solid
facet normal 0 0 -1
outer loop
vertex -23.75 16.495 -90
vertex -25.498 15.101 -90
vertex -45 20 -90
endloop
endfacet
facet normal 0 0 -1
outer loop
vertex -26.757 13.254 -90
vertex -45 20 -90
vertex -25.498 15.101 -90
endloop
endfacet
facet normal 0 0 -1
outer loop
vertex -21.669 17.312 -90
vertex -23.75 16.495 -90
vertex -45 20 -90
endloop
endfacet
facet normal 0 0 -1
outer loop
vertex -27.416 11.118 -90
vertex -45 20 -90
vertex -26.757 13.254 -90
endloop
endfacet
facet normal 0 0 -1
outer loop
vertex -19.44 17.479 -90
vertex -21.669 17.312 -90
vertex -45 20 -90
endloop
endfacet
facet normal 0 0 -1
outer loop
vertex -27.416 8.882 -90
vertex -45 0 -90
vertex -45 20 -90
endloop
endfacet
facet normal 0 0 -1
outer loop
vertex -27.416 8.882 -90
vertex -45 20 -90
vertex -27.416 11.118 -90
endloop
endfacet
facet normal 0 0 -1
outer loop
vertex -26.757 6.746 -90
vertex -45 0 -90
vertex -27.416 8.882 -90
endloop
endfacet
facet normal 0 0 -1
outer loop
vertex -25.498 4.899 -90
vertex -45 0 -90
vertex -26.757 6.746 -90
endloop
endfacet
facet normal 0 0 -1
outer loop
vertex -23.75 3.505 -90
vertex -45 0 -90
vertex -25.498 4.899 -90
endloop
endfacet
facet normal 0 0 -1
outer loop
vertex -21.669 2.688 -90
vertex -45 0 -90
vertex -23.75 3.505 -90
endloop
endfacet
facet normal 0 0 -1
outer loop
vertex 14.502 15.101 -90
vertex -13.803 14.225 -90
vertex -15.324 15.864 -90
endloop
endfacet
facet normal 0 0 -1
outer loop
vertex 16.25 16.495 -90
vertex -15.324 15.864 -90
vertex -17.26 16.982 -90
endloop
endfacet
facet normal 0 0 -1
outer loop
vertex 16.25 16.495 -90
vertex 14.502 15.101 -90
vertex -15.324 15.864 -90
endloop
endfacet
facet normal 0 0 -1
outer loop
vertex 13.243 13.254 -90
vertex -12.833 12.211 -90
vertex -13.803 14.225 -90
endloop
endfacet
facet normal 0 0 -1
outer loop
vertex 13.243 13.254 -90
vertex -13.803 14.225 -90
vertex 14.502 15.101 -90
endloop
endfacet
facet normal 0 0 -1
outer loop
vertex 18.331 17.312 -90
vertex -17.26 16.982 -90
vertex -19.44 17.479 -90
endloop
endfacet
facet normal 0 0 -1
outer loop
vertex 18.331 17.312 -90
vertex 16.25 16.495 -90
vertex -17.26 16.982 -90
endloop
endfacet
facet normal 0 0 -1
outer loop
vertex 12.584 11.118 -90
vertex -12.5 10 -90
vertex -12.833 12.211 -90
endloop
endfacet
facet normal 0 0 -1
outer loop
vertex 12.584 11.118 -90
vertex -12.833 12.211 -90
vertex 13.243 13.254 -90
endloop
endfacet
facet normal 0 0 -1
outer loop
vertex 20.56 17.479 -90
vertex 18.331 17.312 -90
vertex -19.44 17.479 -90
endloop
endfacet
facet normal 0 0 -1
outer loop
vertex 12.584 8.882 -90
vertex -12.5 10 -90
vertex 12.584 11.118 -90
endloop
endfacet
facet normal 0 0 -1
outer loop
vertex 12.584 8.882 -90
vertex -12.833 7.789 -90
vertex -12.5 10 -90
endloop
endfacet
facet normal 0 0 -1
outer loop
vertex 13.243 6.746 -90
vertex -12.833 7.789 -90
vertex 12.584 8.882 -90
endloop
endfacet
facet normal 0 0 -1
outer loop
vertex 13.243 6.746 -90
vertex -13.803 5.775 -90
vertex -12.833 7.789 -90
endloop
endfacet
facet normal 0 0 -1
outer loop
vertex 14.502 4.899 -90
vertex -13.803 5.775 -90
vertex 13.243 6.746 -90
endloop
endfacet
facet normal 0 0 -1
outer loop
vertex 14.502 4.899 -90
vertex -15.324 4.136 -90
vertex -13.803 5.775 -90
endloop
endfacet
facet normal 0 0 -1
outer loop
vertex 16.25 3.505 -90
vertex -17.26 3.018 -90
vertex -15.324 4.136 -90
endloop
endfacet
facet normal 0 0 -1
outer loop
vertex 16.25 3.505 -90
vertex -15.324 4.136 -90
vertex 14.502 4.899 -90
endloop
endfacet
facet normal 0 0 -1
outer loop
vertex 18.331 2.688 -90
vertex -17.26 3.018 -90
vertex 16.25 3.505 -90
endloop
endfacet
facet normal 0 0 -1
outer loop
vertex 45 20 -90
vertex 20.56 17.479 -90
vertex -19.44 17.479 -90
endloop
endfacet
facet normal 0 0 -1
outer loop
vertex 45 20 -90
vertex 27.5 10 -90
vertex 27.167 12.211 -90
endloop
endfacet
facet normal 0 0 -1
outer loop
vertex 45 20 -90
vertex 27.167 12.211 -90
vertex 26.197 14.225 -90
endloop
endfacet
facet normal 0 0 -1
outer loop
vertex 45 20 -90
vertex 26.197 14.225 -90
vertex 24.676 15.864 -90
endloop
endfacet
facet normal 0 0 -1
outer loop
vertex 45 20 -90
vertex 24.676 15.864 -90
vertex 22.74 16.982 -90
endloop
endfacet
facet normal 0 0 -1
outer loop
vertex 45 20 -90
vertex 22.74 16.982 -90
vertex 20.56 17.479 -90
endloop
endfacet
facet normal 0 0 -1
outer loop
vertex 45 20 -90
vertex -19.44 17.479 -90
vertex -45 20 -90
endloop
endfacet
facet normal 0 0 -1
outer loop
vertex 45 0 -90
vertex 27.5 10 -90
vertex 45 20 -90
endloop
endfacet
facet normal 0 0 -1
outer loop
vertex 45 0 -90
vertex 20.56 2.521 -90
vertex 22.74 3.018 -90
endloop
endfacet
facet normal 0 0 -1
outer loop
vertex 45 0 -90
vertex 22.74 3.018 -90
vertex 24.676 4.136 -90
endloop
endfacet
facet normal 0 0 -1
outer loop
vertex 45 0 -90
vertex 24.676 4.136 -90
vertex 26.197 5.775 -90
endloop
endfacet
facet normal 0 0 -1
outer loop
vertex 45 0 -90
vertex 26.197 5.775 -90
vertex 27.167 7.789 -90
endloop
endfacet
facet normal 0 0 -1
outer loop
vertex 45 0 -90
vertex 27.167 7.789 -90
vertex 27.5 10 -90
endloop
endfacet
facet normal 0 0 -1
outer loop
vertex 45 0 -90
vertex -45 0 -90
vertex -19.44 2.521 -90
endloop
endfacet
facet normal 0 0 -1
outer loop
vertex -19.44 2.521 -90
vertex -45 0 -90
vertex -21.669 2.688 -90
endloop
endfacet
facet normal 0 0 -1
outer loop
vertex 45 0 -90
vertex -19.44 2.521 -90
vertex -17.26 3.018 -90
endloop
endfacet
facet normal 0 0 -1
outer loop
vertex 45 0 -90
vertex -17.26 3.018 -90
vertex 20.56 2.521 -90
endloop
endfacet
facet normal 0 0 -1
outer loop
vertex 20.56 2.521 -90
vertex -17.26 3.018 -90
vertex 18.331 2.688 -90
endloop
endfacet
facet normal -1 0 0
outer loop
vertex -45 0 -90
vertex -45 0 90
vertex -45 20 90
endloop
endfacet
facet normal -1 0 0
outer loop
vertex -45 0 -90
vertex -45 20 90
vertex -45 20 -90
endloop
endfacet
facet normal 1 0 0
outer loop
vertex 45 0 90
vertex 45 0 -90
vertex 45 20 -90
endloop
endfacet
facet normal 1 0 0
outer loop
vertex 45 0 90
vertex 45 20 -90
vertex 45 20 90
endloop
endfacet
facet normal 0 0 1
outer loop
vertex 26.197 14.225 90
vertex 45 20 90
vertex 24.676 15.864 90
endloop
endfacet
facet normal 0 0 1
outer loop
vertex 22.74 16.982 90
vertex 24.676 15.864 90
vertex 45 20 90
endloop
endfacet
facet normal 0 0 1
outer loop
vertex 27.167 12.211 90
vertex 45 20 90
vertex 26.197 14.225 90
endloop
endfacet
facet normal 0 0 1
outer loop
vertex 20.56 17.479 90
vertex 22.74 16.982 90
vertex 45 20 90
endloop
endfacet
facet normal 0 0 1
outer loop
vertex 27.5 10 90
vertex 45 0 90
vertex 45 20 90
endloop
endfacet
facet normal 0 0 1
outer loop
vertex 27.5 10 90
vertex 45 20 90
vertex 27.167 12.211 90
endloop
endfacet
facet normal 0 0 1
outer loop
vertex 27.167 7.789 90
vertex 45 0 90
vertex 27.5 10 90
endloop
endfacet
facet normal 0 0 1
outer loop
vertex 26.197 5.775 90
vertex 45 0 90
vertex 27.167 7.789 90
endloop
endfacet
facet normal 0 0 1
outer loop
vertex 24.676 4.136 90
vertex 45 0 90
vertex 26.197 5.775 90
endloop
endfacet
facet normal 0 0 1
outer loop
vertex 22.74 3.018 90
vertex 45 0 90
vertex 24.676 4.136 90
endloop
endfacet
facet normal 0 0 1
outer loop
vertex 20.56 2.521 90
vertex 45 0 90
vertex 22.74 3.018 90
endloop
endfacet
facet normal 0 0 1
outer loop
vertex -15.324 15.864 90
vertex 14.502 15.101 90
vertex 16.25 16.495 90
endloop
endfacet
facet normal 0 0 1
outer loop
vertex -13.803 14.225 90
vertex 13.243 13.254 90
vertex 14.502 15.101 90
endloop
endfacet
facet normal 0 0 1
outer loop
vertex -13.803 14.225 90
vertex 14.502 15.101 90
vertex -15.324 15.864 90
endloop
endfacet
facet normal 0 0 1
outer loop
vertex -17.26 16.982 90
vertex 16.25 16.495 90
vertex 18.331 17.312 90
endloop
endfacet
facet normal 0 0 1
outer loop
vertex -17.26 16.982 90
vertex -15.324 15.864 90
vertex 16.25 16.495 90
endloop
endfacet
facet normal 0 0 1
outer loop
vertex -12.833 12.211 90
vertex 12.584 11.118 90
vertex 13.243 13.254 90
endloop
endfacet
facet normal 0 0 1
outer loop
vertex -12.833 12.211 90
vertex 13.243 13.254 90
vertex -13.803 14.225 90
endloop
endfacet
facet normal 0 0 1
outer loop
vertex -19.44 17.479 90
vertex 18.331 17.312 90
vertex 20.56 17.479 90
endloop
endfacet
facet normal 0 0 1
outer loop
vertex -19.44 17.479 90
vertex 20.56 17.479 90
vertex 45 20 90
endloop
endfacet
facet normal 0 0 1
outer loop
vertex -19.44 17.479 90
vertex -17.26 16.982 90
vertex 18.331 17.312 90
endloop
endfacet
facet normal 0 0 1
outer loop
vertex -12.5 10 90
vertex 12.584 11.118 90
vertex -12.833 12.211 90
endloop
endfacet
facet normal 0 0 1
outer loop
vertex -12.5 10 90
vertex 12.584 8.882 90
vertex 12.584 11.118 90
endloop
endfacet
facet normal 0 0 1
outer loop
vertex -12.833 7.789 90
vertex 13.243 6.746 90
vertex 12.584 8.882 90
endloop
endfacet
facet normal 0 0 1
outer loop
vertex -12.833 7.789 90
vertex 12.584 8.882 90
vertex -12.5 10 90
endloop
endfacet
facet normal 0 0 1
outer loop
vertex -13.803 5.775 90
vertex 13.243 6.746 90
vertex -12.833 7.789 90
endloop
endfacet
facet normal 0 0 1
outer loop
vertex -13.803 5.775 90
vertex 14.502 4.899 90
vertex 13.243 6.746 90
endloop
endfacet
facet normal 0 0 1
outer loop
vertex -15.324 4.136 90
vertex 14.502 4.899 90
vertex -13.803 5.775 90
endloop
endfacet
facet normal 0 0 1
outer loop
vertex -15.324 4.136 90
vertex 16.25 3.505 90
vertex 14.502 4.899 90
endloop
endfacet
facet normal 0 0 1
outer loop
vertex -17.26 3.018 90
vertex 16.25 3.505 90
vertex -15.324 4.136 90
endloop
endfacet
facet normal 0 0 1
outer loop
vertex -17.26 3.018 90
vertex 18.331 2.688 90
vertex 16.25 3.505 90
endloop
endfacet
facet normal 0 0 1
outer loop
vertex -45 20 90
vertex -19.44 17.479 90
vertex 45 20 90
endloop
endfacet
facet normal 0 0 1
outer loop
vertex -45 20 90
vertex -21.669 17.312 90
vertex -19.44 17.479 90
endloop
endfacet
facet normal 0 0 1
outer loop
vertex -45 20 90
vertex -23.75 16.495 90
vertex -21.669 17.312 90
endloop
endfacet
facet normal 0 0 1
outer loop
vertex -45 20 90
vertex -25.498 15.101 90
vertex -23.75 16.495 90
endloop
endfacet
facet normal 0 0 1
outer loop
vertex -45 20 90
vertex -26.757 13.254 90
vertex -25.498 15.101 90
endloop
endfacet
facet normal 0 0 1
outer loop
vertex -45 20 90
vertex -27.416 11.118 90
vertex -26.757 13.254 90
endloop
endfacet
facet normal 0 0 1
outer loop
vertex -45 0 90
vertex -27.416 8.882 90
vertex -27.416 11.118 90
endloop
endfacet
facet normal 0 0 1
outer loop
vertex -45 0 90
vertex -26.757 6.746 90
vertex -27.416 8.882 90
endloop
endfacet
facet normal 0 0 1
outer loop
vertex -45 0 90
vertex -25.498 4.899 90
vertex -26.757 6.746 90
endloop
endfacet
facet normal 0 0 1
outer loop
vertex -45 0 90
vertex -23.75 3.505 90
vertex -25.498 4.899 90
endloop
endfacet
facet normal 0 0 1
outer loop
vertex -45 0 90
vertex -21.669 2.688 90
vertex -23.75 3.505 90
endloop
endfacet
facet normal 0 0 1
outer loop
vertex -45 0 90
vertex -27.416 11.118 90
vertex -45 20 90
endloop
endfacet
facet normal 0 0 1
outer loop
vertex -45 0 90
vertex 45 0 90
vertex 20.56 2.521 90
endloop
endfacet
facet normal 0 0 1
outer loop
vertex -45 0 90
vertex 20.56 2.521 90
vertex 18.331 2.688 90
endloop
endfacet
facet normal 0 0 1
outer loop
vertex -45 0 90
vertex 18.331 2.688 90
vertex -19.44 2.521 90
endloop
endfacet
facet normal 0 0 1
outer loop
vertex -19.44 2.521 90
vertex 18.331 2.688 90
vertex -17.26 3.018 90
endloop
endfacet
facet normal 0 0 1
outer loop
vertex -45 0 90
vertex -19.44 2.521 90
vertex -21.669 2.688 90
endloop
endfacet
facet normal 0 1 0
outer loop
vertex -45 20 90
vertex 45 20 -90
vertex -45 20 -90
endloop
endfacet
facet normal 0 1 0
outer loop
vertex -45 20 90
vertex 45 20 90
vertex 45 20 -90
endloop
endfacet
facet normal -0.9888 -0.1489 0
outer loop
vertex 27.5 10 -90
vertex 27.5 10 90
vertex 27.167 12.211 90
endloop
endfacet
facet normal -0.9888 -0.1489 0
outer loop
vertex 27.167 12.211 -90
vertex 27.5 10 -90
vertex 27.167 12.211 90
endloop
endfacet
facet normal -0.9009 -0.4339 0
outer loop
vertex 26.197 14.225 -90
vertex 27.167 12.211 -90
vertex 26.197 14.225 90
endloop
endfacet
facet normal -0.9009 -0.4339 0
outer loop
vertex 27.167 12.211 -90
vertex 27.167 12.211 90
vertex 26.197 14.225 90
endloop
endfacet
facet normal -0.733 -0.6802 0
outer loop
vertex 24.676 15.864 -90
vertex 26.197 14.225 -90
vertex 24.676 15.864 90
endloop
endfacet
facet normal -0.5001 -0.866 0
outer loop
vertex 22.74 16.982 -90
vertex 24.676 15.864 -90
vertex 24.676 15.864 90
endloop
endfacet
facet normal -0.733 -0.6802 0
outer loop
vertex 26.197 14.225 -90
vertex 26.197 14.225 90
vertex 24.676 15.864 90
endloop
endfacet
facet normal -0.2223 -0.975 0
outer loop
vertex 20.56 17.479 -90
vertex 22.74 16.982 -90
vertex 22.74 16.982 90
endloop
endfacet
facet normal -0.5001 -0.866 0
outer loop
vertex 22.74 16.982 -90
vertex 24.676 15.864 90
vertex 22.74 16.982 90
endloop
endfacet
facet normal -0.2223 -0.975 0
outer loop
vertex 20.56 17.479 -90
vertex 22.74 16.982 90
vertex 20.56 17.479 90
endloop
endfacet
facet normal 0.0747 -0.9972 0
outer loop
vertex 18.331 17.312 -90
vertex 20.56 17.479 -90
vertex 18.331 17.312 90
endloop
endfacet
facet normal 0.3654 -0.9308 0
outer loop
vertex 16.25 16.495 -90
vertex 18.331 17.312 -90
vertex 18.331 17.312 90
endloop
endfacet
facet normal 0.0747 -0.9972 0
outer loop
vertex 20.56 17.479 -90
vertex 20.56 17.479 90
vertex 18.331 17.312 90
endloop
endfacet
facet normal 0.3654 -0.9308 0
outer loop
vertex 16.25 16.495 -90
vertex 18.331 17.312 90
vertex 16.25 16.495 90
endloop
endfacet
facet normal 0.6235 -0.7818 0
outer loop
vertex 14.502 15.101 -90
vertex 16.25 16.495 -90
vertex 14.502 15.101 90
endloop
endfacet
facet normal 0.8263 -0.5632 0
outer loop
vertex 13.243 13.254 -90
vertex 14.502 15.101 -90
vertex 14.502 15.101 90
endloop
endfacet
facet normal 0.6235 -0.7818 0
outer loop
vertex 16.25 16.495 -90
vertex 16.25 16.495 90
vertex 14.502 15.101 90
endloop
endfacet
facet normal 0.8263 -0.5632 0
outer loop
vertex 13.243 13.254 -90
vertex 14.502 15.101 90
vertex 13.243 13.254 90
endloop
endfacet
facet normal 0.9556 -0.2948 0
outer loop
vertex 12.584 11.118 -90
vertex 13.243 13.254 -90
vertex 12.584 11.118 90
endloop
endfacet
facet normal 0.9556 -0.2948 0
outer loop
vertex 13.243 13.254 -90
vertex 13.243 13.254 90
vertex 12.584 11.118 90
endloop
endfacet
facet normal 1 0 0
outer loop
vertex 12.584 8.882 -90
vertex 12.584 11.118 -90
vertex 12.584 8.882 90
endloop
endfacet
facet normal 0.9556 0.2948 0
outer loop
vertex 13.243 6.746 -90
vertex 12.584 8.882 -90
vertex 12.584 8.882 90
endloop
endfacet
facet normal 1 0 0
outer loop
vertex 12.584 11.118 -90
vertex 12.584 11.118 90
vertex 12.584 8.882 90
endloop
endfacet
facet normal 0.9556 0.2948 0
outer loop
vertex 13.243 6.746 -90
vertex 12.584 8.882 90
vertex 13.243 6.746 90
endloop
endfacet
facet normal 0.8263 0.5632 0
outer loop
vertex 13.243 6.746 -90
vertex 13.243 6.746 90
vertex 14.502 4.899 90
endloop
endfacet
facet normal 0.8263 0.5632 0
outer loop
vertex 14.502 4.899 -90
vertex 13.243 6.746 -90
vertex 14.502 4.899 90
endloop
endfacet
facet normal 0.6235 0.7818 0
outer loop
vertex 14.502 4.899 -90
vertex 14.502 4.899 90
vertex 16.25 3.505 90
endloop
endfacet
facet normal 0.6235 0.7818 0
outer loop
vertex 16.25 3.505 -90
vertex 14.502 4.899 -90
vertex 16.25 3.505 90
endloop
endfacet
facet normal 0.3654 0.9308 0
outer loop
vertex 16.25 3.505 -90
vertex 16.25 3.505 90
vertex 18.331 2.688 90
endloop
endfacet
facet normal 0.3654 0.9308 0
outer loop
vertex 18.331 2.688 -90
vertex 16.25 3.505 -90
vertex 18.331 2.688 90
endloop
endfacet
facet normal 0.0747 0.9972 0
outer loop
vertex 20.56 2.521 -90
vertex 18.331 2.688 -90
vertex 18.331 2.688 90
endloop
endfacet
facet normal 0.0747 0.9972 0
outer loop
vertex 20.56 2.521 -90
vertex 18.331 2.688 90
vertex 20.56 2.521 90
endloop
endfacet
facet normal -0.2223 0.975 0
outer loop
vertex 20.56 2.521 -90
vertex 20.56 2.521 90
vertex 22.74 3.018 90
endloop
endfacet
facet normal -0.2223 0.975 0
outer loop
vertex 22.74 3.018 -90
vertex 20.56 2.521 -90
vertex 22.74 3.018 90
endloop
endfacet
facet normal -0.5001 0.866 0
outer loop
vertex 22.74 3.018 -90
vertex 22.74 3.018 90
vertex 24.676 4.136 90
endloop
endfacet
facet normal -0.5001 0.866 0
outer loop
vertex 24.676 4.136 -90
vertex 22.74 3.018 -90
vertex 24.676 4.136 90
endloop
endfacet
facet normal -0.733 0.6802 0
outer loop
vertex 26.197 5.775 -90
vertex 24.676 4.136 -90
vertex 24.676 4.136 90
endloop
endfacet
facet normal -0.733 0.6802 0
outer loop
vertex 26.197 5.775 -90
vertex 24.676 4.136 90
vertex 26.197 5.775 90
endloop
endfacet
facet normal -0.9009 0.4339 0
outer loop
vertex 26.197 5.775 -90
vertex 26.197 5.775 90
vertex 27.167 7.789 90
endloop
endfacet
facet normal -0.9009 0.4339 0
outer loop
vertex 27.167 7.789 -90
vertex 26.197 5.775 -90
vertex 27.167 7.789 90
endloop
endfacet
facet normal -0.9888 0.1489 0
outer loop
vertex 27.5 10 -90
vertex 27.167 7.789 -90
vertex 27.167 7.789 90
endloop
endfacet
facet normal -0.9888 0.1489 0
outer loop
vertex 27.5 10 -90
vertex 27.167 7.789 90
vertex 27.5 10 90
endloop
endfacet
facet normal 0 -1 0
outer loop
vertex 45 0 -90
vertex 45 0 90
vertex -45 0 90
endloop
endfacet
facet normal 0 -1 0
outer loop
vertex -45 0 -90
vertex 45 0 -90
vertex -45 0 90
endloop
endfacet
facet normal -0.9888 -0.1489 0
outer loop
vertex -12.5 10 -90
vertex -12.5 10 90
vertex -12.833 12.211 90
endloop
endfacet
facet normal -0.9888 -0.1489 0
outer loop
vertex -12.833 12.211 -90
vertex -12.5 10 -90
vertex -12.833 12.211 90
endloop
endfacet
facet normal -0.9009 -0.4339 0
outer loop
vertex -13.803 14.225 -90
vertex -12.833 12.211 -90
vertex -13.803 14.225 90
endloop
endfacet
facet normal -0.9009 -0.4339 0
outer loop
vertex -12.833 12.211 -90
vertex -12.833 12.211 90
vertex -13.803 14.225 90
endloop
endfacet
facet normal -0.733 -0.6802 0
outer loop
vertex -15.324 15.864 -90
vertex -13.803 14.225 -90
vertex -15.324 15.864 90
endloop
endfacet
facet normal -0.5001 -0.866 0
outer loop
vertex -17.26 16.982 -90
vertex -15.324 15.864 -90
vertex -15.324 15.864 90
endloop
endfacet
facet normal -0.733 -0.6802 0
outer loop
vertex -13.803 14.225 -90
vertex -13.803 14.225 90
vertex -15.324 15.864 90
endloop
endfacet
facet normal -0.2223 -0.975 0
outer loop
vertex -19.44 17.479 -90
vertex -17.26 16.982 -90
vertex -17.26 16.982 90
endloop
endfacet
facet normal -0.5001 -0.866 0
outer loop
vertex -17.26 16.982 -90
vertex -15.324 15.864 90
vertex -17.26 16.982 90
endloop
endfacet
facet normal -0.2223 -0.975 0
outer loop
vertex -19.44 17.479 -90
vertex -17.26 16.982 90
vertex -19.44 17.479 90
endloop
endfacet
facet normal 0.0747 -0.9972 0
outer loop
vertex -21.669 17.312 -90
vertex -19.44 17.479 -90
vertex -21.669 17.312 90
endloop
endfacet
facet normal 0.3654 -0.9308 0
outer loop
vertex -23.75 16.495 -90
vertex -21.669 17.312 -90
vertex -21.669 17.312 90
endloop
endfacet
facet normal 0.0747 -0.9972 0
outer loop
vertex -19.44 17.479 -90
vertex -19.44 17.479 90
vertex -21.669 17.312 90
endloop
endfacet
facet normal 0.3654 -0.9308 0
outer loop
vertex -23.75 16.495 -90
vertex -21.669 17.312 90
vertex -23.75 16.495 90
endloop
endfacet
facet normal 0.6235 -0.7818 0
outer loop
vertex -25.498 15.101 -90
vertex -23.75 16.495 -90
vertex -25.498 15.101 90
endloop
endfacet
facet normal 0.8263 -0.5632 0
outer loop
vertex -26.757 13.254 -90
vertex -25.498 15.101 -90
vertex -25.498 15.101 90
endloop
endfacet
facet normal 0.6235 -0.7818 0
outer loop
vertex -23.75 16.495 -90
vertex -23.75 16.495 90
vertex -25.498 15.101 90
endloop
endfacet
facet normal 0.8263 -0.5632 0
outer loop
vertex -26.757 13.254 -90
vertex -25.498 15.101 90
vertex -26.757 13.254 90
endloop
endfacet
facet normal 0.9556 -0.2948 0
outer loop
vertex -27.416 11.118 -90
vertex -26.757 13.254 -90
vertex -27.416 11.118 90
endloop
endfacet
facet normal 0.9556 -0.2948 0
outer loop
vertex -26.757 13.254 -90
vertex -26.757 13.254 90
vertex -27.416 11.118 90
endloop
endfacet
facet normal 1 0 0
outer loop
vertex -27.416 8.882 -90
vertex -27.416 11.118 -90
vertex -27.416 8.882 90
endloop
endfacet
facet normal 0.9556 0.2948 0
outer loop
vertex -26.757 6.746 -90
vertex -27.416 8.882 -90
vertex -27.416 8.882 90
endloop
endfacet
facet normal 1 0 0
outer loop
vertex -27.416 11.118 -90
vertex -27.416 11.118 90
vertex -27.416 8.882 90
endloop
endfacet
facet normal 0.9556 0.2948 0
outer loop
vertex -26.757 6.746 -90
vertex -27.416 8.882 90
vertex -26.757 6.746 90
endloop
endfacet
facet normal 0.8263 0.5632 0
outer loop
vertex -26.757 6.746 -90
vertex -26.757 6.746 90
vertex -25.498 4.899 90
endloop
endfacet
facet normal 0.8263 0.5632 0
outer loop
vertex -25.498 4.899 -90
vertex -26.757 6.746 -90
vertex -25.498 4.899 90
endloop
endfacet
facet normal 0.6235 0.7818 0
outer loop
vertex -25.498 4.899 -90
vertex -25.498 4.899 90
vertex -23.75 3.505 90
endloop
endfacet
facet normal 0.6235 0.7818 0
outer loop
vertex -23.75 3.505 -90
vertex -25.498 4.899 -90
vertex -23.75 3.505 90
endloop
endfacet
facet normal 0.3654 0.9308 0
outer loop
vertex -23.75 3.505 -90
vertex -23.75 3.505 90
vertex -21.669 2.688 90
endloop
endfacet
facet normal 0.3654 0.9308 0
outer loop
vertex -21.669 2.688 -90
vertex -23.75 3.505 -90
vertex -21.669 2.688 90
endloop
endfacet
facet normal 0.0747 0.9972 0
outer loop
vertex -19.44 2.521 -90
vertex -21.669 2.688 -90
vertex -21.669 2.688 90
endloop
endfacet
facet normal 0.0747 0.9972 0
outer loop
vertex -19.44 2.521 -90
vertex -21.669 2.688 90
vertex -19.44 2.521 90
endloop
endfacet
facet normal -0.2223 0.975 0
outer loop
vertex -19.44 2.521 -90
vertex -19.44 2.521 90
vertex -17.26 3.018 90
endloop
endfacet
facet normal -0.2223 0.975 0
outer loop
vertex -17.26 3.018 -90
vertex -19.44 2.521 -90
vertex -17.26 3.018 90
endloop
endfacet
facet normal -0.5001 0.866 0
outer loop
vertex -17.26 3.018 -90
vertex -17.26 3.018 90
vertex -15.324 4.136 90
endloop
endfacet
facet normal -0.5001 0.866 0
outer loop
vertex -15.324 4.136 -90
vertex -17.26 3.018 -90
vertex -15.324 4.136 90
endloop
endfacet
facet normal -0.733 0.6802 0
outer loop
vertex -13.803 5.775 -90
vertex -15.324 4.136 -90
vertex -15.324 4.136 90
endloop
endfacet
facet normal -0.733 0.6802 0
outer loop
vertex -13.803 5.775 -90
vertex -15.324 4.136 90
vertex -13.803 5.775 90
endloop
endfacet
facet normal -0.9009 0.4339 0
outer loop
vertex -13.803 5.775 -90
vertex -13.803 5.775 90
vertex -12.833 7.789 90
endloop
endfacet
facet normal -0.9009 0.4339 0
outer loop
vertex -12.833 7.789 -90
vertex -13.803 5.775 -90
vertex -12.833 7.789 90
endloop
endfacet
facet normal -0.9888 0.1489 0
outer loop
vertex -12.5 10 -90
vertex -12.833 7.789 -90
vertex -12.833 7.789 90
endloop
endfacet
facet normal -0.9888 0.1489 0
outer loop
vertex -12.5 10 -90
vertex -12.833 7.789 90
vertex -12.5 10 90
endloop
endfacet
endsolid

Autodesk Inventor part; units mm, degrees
ref_plane "YZ Plane" through (0, 0, 0) normal (1, 0, 0) x (0, 1, 0)
ref_plane "XZ Plane" through (0, 0, 0) normal (0, 1, 0) x (-1, 0, 0)
ref_plane "XY Plane" through (0, 0, 0) normal (0, 0, 1) x (1, 0, 0)
sketch "Sketch1" plane through (0, 0, 0) normal (0, 1, 0) x (-1, 0, 0)
  line L0 (-45, 90) -> (45, 90)
  line L1 (45, 90) -> (45, -90)
  line L2 (45, -90) -> (-45, -90)
  line L3 (-45, -90) -> (-45, 90)
  line L4 (-45, 90) -> (45, -90) construction
  line L5 (45, 90) -> (-45, -90) construction
  point P0 (0, 0)
  dimension "d0" = 180
  dimension "d1" = 90
extrude "Extrusion1" add sketch "Sketch1" along normal blind 20
sketch "Sketch2" plane through (-45, 0, 90) normal (0, 0, 1) x (1, 0, 0)
  circle A0 centre (65, 10) radius 7.5
  circle A1 centre (25, 10) radius 7.5
  point P0 (45, 0)
  dimension "d4" = 20
  dimension "d5" = 20
  dimension "d6" = 10
  dimension "d7" = 10
  dimension "d8" = 15
  dimension "d9" = 15
extrude "Extrusion2" cut sketch "Sketch2" against normal through all
properties part number "Motor Platform"
